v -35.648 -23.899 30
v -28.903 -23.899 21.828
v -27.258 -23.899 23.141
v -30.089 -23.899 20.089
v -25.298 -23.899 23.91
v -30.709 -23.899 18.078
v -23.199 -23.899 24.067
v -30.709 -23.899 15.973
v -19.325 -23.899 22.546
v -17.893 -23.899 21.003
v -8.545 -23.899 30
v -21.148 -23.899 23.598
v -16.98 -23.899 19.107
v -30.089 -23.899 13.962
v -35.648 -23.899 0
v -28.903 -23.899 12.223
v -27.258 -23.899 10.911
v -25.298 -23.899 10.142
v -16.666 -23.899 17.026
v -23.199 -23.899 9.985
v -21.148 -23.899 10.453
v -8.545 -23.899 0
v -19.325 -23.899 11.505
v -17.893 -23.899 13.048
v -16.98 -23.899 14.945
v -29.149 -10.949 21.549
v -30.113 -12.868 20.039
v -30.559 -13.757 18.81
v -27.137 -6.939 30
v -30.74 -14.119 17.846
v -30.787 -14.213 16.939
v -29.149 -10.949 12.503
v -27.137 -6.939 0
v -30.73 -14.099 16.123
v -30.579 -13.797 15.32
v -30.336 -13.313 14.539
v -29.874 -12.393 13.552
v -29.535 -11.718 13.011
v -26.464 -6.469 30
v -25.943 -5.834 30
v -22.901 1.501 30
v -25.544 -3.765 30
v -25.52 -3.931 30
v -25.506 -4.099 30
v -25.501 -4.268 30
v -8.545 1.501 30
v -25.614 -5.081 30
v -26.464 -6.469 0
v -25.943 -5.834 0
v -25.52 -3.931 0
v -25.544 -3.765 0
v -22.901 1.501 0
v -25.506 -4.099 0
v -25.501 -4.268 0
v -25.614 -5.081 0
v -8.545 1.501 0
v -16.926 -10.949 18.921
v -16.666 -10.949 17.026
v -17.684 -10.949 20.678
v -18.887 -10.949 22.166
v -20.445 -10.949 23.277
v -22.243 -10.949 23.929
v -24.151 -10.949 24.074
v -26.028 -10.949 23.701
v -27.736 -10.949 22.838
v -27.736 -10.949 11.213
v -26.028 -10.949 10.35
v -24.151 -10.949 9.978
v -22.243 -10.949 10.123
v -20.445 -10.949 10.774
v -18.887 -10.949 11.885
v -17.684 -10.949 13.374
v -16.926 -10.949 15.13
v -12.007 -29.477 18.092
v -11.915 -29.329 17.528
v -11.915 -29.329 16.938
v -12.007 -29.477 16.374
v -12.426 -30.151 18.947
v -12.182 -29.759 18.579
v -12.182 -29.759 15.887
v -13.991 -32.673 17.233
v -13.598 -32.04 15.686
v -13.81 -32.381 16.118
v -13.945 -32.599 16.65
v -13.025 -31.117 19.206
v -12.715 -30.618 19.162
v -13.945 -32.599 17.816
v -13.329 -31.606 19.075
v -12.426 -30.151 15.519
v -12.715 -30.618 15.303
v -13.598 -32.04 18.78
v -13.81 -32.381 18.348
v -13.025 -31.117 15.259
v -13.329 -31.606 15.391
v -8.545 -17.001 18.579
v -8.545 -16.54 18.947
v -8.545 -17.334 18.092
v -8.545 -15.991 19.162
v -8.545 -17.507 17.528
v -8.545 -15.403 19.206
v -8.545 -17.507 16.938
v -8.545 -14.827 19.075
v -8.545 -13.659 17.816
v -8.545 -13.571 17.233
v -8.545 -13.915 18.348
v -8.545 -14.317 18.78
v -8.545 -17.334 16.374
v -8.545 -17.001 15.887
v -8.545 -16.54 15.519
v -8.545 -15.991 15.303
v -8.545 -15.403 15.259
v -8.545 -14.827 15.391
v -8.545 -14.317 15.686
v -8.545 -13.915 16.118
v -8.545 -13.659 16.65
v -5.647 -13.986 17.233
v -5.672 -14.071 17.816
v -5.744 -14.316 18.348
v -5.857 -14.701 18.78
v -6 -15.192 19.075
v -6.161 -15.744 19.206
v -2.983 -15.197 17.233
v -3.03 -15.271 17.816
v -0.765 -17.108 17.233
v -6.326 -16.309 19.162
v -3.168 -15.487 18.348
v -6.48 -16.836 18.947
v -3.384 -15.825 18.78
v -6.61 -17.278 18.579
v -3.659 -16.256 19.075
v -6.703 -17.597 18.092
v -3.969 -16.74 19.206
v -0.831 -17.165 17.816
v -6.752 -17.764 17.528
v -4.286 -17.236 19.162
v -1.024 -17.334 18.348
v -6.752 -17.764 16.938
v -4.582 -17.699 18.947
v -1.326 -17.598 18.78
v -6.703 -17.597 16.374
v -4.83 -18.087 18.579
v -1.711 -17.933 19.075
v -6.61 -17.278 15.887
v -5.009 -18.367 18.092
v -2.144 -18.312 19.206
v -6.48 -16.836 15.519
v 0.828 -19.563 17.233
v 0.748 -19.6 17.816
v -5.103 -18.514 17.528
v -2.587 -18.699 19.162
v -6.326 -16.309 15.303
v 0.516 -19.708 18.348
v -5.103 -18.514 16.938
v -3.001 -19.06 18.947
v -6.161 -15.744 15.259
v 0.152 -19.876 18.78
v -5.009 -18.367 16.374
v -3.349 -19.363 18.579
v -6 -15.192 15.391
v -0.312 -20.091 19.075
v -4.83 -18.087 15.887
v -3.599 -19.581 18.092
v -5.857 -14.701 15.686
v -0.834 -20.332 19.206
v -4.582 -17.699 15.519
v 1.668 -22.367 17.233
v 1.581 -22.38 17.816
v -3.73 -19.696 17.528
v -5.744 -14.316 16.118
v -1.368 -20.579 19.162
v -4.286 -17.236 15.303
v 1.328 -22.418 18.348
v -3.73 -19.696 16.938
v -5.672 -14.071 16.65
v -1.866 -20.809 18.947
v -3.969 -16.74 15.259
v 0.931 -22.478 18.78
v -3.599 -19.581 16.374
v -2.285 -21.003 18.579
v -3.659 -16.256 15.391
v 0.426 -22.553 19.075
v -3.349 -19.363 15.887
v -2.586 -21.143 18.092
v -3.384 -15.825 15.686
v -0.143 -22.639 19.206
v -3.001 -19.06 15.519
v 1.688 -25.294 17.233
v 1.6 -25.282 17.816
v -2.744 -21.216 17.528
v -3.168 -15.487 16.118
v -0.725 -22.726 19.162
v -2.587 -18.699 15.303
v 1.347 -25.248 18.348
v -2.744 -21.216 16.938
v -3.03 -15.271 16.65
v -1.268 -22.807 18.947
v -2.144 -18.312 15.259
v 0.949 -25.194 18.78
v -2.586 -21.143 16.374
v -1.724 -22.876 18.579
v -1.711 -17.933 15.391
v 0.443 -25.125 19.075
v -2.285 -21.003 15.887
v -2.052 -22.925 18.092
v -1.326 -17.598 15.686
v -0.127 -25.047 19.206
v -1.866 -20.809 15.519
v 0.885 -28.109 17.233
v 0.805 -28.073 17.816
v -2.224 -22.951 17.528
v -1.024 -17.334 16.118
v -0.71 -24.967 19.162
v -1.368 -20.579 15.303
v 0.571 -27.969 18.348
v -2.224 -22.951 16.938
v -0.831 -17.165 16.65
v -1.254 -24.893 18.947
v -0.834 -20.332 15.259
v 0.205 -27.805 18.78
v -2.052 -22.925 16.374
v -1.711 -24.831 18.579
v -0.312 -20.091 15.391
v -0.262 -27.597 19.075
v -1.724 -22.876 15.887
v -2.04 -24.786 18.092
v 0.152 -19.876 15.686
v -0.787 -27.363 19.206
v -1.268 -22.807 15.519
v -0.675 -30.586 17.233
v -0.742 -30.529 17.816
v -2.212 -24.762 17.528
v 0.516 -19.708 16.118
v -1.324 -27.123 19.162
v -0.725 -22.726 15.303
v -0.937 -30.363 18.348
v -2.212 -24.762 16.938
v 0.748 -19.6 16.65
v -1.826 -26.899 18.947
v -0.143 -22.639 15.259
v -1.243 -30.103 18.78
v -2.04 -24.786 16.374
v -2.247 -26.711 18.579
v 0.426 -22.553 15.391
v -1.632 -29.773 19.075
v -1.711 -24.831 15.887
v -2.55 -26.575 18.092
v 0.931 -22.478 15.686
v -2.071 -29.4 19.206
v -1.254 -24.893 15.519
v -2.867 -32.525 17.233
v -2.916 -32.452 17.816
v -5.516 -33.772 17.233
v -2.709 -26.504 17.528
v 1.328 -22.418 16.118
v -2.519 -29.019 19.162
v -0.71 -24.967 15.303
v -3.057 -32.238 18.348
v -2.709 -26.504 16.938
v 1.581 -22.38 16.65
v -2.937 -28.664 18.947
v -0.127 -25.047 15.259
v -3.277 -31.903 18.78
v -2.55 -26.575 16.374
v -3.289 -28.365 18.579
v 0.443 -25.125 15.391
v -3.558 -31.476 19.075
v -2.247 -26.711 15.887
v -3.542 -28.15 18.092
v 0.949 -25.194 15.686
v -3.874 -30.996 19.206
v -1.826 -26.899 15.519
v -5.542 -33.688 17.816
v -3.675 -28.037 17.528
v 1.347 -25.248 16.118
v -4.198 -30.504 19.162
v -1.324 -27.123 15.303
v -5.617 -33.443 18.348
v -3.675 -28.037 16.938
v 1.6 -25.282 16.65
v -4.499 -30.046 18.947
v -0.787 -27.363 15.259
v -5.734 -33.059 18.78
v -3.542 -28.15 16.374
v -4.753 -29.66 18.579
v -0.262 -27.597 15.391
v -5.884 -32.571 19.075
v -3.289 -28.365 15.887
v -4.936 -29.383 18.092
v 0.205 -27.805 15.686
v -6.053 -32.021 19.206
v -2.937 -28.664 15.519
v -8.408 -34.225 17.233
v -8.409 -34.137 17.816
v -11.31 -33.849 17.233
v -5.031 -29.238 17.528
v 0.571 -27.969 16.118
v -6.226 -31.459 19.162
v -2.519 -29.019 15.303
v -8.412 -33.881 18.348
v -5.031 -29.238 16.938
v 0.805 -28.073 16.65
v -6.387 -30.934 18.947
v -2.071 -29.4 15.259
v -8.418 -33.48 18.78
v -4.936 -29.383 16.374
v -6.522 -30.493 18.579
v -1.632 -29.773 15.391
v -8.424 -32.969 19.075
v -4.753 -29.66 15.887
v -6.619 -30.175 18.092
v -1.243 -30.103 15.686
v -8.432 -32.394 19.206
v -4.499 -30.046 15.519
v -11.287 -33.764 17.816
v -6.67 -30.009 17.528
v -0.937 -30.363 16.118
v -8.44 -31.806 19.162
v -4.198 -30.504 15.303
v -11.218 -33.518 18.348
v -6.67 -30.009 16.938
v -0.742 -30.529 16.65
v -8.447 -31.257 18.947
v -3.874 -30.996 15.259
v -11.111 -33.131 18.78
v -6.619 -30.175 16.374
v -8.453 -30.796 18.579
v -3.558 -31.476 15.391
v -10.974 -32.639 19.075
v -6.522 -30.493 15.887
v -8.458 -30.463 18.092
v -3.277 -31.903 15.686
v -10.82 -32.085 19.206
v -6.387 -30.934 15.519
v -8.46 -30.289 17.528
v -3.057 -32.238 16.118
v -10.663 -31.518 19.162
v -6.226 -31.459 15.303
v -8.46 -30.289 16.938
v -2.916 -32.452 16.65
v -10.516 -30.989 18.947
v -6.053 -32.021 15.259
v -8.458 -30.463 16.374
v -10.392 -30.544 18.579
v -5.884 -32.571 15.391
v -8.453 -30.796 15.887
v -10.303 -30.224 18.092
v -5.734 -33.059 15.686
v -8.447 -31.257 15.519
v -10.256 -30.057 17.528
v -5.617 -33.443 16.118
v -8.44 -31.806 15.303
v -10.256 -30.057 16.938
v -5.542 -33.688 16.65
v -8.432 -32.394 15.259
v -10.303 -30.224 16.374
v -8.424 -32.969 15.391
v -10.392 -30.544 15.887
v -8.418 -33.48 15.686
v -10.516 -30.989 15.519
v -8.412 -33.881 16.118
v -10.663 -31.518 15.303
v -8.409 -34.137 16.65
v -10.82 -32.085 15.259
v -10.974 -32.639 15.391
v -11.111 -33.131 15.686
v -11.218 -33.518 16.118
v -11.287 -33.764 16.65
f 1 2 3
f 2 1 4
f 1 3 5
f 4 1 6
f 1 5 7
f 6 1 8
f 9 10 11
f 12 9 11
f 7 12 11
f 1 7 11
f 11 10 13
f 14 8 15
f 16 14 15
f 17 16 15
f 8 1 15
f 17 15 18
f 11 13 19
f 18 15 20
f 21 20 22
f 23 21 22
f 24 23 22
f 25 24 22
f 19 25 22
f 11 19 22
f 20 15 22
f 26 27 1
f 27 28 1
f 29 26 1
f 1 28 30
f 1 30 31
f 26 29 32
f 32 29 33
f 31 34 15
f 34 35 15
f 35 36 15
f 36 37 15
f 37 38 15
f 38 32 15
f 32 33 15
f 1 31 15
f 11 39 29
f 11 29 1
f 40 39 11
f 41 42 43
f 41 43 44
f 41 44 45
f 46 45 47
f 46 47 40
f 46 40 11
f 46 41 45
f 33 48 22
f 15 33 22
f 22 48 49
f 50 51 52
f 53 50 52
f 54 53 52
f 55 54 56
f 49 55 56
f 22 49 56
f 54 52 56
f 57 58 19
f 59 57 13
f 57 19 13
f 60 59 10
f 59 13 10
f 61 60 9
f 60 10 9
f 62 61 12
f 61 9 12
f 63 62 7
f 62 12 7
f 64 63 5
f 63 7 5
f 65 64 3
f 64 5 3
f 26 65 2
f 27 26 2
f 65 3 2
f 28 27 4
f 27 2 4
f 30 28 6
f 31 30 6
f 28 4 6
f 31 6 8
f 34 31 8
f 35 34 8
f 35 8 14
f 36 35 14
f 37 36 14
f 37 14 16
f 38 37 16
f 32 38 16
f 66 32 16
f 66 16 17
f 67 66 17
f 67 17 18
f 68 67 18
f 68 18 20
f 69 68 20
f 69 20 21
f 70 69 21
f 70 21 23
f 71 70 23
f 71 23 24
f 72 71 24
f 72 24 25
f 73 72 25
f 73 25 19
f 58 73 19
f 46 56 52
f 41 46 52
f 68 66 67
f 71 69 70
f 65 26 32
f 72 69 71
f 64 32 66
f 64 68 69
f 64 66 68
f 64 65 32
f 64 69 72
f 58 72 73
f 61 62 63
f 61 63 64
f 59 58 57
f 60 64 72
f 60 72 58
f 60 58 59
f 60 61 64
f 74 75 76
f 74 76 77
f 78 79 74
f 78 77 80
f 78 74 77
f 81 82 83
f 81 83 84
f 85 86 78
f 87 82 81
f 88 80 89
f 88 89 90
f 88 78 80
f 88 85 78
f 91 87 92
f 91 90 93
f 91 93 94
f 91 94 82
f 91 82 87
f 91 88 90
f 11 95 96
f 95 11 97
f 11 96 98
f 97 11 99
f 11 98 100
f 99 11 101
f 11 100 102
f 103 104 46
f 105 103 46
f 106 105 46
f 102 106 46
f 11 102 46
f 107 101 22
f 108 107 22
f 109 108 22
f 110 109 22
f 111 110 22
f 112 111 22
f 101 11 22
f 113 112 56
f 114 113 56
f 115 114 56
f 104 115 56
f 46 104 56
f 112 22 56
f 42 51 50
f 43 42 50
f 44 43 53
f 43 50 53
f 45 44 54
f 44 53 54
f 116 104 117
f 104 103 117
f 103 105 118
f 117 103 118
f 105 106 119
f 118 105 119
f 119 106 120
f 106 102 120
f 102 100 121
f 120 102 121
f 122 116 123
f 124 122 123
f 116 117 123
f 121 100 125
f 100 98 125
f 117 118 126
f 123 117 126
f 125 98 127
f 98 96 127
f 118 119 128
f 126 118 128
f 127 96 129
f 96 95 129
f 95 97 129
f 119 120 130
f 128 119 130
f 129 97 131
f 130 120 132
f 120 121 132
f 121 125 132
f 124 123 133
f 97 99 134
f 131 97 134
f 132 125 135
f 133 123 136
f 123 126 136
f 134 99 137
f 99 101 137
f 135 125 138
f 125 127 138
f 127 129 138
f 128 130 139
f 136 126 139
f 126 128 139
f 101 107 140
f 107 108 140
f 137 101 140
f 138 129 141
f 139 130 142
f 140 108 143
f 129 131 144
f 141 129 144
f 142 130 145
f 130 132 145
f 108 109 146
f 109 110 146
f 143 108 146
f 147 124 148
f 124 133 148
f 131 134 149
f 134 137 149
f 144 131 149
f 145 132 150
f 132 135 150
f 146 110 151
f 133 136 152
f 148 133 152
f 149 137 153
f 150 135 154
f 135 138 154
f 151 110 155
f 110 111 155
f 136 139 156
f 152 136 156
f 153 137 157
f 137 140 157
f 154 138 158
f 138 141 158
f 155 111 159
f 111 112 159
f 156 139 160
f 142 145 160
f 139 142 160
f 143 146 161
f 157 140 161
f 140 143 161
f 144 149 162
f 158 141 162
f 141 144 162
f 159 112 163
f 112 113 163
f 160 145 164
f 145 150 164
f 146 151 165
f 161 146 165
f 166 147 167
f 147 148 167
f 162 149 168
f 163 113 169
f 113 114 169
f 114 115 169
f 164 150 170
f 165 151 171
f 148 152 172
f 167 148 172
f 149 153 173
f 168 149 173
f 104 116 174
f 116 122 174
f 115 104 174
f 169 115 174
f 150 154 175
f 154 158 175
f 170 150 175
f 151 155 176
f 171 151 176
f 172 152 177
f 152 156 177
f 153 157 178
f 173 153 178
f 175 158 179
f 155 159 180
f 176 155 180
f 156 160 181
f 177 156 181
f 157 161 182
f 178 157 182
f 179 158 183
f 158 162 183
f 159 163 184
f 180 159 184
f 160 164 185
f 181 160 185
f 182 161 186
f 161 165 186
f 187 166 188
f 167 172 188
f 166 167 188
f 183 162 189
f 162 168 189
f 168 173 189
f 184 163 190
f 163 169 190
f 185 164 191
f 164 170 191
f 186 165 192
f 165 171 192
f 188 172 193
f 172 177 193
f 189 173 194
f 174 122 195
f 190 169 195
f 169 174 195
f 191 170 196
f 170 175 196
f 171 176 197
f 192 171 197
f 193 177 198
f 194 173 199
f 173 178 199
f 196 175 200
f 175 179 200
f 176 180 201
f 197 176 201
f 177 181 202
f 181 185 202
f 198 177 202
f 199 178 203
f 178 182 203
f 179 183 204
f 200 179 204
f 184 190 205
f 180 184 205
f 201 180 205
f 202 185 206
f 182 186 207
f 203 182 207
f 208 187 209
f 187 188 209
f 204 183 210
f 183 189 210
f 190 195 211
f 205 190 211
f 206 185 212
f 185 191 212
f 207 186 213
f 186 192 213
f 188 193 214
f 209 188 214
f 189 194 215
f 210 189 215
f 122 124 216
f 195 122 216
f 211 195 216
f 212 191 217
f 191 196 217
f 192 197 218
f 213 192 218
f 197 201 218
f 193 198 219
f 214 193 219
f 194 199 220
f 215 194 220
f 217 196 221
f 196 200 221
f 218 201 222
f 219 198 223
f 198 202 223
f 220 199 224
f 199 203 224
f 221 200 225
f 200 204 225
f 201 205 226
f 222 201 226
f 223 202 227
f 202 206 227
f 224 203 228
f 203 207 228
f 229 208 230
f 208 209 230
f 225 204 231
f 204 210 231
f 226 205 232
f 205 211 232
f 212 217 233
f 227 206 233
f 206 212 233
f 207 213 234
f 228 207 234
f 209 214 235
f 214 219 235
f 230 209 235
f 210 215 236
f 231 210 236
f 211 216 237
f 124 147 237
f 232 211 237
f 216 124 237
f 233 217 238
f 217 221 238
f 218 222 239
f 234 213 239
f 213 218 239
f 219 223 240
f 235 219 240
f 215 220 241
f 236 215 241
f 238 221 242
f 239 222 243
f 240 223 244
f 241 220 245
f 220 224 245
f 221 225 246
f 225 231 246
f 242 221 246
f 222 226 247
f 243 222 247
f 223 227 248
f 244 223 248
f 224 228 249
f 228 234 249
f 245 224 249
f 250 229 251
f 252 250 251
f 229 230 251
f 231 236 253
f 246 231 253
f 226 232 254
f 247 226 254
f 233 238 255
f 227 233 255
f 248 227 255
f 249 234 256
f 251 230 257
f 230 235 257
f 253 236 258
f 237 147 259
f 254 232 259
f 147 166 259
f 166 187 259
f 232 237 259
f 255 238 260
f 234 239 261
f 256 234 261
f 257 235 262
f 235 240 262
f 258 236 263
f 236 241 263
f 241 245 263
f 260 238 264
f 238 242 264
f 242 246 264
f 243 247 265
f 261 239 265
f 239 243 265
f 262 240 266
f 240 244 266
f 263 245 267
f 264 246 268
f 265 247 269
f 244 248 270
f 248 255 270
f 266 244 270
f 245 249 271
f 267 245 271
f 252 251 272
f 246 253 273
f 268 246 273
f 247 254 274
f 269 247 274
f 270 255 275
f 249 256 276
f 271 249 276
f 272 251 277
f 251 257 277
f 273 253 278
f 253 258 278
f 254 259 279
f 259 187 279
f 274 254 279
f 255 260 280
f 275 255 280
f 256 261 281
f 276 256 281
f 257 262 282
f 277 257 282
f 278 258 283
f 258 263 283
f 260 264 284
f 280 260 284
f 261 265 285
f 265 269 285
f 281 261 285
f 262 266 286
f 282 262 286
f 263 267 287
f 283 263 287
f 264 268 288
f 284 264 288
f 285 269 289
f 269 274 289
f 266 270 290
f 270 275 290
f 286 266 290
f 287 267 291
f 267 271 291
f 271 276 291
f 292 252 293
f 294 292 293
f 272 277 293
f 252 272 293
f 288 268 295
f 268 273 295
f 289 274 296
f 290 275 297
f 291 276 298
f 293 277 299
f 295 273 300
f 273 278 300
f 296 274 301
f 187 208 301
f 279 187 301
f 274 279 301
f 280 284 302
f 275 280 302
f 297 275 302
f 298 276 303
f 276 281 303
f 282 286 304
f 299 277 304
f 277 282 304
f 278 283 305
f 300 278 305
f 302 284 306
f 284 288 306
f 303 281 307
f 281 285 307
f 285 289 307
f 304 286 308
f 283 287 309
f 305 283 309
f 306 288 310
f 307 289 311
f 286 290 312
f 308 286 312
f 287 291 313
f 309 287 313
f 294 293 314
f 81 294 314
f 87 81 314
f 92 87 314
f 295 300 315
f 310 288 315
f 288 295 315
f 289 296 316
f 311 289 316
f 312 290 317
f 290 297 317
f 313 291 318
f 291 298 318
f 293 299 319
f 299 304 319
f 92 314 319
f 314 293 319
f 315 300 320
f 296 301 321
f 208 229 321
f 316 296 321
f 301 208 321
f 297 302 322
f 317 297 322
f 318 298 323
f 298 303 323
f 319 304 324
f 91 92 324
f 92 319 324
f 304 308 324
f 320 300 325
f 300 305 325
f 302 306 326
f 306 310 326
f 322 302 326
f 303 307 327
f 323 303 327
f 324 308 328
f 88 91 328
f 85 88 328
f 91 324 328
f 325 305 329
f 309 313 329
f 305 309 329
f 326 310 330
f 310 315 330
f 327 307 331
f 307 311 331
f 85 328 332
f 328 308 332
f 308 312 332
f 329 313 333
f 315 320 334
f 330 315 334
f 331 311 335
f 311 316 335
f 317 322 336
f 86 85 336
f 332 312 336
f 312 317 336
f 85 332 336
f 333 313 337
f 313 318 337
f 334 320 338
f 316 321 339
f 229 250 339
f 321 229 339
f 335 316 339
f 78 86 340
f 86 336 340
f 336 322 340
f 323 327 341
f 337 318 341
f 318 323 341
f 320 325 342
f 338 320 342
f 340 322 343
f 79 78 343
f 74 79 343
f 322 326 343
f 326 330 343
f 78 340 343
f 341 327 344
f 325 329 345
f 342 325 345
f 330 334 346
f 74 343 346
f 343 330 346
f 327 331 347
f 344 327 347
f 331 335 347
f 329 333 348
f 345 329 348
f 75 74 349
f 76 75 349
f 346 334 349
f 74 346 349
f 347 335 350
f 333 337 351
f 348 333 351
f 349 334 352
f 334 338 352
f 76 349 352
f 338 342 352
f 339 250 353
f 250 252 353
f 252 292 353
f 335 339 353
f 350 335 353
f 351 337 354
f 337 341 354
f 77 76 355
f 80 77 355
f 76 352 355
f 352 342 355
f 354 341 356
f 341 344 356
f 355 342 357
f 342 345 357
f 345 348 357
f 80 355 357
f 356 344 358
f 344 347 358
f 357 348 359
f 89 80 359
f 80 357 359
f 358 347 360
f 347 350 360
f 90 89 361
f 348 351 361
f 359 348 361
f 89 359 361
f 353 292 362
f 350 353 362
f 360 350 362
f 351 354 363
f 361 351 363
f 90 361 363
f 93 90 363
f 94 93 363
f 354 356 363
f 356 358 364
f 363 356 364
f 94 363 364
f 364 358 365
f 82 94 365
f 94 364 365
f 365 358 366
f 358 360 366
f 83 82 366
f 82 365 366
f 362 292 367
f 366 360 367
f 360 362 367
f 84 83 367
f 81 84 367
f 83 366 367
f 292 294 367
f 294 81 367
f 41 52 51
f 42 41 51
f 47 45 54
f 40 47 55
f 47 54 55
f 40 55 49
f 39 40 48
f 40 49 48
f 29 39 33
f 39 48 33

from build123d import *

# Parameters (mm, degrees)
F1_DEPTH = 30
F2_R     = 7.0607743661
F3_DEPTH = 12.95017
F4_R     = 1.9790251597
F5_ANGLE = 211.8266616901


# Not quite as in the source:
# - a feature of the source that left no trace in its solid (it failed there, or was rolled back) is left out


with BuildPart() as f1:
    # F0 (on Top) → F1 (new body)
    with BuildSketch(Plane.XY):
        with BuildLine():
            Line((-8.5449986998, 1.5012763055), (-22.9009841796, 1.5012763055))
            Line((-22.9009841796, 1.5012763055), (-25.5437633875, -3.7646328319))
            ThreePointArc((-25.5437633875, -3.7646328319), (-25.5119398754, -4.015202253), (-25.5013069136, -4.2675605514))
            ThreePointArc((-25.5013069136, -4.2675605514), (-25.9427272038, -5.8339799934), (-27.1370868258, -6.9394332191))
            Line((-27.1370868258, -6.9394332191), (-35.6483731166, -23.8987236945))
            Line((-35.6483731166, -23.8987236945), (-8.5449986998, -23.8987236945))
            Line((-8.5449986998, -23.8987236945), (-8.5449986998, 1.5012763055))
        make_face()
    extrude(amount=F1_DEPTH)

    # F2 (on face) → F3 (cut)
    with BuildSketch(Plane.XZ.offset(23.8987236945)):
        with Locations((-23.7271394581, 17.0257668942)):
            Circle(F2_R)
    extrude(amount=-F3_DEPTH, mode=Mode.SUBTRACT)

    # F4 (on face) → F5 (revolve)
    with BuildSketch(Plane.YZ.offset(-8.5449986998)):
        with Locations((-15.5504914001, 17.2328893095)):
            Circle(F4_R)
    revolve(axis=Axis((-8.5449986998, -23.8987236945, 15), (0, 0, -1)), revolution_arc=F5_ANGLE)


solid = f1.part
